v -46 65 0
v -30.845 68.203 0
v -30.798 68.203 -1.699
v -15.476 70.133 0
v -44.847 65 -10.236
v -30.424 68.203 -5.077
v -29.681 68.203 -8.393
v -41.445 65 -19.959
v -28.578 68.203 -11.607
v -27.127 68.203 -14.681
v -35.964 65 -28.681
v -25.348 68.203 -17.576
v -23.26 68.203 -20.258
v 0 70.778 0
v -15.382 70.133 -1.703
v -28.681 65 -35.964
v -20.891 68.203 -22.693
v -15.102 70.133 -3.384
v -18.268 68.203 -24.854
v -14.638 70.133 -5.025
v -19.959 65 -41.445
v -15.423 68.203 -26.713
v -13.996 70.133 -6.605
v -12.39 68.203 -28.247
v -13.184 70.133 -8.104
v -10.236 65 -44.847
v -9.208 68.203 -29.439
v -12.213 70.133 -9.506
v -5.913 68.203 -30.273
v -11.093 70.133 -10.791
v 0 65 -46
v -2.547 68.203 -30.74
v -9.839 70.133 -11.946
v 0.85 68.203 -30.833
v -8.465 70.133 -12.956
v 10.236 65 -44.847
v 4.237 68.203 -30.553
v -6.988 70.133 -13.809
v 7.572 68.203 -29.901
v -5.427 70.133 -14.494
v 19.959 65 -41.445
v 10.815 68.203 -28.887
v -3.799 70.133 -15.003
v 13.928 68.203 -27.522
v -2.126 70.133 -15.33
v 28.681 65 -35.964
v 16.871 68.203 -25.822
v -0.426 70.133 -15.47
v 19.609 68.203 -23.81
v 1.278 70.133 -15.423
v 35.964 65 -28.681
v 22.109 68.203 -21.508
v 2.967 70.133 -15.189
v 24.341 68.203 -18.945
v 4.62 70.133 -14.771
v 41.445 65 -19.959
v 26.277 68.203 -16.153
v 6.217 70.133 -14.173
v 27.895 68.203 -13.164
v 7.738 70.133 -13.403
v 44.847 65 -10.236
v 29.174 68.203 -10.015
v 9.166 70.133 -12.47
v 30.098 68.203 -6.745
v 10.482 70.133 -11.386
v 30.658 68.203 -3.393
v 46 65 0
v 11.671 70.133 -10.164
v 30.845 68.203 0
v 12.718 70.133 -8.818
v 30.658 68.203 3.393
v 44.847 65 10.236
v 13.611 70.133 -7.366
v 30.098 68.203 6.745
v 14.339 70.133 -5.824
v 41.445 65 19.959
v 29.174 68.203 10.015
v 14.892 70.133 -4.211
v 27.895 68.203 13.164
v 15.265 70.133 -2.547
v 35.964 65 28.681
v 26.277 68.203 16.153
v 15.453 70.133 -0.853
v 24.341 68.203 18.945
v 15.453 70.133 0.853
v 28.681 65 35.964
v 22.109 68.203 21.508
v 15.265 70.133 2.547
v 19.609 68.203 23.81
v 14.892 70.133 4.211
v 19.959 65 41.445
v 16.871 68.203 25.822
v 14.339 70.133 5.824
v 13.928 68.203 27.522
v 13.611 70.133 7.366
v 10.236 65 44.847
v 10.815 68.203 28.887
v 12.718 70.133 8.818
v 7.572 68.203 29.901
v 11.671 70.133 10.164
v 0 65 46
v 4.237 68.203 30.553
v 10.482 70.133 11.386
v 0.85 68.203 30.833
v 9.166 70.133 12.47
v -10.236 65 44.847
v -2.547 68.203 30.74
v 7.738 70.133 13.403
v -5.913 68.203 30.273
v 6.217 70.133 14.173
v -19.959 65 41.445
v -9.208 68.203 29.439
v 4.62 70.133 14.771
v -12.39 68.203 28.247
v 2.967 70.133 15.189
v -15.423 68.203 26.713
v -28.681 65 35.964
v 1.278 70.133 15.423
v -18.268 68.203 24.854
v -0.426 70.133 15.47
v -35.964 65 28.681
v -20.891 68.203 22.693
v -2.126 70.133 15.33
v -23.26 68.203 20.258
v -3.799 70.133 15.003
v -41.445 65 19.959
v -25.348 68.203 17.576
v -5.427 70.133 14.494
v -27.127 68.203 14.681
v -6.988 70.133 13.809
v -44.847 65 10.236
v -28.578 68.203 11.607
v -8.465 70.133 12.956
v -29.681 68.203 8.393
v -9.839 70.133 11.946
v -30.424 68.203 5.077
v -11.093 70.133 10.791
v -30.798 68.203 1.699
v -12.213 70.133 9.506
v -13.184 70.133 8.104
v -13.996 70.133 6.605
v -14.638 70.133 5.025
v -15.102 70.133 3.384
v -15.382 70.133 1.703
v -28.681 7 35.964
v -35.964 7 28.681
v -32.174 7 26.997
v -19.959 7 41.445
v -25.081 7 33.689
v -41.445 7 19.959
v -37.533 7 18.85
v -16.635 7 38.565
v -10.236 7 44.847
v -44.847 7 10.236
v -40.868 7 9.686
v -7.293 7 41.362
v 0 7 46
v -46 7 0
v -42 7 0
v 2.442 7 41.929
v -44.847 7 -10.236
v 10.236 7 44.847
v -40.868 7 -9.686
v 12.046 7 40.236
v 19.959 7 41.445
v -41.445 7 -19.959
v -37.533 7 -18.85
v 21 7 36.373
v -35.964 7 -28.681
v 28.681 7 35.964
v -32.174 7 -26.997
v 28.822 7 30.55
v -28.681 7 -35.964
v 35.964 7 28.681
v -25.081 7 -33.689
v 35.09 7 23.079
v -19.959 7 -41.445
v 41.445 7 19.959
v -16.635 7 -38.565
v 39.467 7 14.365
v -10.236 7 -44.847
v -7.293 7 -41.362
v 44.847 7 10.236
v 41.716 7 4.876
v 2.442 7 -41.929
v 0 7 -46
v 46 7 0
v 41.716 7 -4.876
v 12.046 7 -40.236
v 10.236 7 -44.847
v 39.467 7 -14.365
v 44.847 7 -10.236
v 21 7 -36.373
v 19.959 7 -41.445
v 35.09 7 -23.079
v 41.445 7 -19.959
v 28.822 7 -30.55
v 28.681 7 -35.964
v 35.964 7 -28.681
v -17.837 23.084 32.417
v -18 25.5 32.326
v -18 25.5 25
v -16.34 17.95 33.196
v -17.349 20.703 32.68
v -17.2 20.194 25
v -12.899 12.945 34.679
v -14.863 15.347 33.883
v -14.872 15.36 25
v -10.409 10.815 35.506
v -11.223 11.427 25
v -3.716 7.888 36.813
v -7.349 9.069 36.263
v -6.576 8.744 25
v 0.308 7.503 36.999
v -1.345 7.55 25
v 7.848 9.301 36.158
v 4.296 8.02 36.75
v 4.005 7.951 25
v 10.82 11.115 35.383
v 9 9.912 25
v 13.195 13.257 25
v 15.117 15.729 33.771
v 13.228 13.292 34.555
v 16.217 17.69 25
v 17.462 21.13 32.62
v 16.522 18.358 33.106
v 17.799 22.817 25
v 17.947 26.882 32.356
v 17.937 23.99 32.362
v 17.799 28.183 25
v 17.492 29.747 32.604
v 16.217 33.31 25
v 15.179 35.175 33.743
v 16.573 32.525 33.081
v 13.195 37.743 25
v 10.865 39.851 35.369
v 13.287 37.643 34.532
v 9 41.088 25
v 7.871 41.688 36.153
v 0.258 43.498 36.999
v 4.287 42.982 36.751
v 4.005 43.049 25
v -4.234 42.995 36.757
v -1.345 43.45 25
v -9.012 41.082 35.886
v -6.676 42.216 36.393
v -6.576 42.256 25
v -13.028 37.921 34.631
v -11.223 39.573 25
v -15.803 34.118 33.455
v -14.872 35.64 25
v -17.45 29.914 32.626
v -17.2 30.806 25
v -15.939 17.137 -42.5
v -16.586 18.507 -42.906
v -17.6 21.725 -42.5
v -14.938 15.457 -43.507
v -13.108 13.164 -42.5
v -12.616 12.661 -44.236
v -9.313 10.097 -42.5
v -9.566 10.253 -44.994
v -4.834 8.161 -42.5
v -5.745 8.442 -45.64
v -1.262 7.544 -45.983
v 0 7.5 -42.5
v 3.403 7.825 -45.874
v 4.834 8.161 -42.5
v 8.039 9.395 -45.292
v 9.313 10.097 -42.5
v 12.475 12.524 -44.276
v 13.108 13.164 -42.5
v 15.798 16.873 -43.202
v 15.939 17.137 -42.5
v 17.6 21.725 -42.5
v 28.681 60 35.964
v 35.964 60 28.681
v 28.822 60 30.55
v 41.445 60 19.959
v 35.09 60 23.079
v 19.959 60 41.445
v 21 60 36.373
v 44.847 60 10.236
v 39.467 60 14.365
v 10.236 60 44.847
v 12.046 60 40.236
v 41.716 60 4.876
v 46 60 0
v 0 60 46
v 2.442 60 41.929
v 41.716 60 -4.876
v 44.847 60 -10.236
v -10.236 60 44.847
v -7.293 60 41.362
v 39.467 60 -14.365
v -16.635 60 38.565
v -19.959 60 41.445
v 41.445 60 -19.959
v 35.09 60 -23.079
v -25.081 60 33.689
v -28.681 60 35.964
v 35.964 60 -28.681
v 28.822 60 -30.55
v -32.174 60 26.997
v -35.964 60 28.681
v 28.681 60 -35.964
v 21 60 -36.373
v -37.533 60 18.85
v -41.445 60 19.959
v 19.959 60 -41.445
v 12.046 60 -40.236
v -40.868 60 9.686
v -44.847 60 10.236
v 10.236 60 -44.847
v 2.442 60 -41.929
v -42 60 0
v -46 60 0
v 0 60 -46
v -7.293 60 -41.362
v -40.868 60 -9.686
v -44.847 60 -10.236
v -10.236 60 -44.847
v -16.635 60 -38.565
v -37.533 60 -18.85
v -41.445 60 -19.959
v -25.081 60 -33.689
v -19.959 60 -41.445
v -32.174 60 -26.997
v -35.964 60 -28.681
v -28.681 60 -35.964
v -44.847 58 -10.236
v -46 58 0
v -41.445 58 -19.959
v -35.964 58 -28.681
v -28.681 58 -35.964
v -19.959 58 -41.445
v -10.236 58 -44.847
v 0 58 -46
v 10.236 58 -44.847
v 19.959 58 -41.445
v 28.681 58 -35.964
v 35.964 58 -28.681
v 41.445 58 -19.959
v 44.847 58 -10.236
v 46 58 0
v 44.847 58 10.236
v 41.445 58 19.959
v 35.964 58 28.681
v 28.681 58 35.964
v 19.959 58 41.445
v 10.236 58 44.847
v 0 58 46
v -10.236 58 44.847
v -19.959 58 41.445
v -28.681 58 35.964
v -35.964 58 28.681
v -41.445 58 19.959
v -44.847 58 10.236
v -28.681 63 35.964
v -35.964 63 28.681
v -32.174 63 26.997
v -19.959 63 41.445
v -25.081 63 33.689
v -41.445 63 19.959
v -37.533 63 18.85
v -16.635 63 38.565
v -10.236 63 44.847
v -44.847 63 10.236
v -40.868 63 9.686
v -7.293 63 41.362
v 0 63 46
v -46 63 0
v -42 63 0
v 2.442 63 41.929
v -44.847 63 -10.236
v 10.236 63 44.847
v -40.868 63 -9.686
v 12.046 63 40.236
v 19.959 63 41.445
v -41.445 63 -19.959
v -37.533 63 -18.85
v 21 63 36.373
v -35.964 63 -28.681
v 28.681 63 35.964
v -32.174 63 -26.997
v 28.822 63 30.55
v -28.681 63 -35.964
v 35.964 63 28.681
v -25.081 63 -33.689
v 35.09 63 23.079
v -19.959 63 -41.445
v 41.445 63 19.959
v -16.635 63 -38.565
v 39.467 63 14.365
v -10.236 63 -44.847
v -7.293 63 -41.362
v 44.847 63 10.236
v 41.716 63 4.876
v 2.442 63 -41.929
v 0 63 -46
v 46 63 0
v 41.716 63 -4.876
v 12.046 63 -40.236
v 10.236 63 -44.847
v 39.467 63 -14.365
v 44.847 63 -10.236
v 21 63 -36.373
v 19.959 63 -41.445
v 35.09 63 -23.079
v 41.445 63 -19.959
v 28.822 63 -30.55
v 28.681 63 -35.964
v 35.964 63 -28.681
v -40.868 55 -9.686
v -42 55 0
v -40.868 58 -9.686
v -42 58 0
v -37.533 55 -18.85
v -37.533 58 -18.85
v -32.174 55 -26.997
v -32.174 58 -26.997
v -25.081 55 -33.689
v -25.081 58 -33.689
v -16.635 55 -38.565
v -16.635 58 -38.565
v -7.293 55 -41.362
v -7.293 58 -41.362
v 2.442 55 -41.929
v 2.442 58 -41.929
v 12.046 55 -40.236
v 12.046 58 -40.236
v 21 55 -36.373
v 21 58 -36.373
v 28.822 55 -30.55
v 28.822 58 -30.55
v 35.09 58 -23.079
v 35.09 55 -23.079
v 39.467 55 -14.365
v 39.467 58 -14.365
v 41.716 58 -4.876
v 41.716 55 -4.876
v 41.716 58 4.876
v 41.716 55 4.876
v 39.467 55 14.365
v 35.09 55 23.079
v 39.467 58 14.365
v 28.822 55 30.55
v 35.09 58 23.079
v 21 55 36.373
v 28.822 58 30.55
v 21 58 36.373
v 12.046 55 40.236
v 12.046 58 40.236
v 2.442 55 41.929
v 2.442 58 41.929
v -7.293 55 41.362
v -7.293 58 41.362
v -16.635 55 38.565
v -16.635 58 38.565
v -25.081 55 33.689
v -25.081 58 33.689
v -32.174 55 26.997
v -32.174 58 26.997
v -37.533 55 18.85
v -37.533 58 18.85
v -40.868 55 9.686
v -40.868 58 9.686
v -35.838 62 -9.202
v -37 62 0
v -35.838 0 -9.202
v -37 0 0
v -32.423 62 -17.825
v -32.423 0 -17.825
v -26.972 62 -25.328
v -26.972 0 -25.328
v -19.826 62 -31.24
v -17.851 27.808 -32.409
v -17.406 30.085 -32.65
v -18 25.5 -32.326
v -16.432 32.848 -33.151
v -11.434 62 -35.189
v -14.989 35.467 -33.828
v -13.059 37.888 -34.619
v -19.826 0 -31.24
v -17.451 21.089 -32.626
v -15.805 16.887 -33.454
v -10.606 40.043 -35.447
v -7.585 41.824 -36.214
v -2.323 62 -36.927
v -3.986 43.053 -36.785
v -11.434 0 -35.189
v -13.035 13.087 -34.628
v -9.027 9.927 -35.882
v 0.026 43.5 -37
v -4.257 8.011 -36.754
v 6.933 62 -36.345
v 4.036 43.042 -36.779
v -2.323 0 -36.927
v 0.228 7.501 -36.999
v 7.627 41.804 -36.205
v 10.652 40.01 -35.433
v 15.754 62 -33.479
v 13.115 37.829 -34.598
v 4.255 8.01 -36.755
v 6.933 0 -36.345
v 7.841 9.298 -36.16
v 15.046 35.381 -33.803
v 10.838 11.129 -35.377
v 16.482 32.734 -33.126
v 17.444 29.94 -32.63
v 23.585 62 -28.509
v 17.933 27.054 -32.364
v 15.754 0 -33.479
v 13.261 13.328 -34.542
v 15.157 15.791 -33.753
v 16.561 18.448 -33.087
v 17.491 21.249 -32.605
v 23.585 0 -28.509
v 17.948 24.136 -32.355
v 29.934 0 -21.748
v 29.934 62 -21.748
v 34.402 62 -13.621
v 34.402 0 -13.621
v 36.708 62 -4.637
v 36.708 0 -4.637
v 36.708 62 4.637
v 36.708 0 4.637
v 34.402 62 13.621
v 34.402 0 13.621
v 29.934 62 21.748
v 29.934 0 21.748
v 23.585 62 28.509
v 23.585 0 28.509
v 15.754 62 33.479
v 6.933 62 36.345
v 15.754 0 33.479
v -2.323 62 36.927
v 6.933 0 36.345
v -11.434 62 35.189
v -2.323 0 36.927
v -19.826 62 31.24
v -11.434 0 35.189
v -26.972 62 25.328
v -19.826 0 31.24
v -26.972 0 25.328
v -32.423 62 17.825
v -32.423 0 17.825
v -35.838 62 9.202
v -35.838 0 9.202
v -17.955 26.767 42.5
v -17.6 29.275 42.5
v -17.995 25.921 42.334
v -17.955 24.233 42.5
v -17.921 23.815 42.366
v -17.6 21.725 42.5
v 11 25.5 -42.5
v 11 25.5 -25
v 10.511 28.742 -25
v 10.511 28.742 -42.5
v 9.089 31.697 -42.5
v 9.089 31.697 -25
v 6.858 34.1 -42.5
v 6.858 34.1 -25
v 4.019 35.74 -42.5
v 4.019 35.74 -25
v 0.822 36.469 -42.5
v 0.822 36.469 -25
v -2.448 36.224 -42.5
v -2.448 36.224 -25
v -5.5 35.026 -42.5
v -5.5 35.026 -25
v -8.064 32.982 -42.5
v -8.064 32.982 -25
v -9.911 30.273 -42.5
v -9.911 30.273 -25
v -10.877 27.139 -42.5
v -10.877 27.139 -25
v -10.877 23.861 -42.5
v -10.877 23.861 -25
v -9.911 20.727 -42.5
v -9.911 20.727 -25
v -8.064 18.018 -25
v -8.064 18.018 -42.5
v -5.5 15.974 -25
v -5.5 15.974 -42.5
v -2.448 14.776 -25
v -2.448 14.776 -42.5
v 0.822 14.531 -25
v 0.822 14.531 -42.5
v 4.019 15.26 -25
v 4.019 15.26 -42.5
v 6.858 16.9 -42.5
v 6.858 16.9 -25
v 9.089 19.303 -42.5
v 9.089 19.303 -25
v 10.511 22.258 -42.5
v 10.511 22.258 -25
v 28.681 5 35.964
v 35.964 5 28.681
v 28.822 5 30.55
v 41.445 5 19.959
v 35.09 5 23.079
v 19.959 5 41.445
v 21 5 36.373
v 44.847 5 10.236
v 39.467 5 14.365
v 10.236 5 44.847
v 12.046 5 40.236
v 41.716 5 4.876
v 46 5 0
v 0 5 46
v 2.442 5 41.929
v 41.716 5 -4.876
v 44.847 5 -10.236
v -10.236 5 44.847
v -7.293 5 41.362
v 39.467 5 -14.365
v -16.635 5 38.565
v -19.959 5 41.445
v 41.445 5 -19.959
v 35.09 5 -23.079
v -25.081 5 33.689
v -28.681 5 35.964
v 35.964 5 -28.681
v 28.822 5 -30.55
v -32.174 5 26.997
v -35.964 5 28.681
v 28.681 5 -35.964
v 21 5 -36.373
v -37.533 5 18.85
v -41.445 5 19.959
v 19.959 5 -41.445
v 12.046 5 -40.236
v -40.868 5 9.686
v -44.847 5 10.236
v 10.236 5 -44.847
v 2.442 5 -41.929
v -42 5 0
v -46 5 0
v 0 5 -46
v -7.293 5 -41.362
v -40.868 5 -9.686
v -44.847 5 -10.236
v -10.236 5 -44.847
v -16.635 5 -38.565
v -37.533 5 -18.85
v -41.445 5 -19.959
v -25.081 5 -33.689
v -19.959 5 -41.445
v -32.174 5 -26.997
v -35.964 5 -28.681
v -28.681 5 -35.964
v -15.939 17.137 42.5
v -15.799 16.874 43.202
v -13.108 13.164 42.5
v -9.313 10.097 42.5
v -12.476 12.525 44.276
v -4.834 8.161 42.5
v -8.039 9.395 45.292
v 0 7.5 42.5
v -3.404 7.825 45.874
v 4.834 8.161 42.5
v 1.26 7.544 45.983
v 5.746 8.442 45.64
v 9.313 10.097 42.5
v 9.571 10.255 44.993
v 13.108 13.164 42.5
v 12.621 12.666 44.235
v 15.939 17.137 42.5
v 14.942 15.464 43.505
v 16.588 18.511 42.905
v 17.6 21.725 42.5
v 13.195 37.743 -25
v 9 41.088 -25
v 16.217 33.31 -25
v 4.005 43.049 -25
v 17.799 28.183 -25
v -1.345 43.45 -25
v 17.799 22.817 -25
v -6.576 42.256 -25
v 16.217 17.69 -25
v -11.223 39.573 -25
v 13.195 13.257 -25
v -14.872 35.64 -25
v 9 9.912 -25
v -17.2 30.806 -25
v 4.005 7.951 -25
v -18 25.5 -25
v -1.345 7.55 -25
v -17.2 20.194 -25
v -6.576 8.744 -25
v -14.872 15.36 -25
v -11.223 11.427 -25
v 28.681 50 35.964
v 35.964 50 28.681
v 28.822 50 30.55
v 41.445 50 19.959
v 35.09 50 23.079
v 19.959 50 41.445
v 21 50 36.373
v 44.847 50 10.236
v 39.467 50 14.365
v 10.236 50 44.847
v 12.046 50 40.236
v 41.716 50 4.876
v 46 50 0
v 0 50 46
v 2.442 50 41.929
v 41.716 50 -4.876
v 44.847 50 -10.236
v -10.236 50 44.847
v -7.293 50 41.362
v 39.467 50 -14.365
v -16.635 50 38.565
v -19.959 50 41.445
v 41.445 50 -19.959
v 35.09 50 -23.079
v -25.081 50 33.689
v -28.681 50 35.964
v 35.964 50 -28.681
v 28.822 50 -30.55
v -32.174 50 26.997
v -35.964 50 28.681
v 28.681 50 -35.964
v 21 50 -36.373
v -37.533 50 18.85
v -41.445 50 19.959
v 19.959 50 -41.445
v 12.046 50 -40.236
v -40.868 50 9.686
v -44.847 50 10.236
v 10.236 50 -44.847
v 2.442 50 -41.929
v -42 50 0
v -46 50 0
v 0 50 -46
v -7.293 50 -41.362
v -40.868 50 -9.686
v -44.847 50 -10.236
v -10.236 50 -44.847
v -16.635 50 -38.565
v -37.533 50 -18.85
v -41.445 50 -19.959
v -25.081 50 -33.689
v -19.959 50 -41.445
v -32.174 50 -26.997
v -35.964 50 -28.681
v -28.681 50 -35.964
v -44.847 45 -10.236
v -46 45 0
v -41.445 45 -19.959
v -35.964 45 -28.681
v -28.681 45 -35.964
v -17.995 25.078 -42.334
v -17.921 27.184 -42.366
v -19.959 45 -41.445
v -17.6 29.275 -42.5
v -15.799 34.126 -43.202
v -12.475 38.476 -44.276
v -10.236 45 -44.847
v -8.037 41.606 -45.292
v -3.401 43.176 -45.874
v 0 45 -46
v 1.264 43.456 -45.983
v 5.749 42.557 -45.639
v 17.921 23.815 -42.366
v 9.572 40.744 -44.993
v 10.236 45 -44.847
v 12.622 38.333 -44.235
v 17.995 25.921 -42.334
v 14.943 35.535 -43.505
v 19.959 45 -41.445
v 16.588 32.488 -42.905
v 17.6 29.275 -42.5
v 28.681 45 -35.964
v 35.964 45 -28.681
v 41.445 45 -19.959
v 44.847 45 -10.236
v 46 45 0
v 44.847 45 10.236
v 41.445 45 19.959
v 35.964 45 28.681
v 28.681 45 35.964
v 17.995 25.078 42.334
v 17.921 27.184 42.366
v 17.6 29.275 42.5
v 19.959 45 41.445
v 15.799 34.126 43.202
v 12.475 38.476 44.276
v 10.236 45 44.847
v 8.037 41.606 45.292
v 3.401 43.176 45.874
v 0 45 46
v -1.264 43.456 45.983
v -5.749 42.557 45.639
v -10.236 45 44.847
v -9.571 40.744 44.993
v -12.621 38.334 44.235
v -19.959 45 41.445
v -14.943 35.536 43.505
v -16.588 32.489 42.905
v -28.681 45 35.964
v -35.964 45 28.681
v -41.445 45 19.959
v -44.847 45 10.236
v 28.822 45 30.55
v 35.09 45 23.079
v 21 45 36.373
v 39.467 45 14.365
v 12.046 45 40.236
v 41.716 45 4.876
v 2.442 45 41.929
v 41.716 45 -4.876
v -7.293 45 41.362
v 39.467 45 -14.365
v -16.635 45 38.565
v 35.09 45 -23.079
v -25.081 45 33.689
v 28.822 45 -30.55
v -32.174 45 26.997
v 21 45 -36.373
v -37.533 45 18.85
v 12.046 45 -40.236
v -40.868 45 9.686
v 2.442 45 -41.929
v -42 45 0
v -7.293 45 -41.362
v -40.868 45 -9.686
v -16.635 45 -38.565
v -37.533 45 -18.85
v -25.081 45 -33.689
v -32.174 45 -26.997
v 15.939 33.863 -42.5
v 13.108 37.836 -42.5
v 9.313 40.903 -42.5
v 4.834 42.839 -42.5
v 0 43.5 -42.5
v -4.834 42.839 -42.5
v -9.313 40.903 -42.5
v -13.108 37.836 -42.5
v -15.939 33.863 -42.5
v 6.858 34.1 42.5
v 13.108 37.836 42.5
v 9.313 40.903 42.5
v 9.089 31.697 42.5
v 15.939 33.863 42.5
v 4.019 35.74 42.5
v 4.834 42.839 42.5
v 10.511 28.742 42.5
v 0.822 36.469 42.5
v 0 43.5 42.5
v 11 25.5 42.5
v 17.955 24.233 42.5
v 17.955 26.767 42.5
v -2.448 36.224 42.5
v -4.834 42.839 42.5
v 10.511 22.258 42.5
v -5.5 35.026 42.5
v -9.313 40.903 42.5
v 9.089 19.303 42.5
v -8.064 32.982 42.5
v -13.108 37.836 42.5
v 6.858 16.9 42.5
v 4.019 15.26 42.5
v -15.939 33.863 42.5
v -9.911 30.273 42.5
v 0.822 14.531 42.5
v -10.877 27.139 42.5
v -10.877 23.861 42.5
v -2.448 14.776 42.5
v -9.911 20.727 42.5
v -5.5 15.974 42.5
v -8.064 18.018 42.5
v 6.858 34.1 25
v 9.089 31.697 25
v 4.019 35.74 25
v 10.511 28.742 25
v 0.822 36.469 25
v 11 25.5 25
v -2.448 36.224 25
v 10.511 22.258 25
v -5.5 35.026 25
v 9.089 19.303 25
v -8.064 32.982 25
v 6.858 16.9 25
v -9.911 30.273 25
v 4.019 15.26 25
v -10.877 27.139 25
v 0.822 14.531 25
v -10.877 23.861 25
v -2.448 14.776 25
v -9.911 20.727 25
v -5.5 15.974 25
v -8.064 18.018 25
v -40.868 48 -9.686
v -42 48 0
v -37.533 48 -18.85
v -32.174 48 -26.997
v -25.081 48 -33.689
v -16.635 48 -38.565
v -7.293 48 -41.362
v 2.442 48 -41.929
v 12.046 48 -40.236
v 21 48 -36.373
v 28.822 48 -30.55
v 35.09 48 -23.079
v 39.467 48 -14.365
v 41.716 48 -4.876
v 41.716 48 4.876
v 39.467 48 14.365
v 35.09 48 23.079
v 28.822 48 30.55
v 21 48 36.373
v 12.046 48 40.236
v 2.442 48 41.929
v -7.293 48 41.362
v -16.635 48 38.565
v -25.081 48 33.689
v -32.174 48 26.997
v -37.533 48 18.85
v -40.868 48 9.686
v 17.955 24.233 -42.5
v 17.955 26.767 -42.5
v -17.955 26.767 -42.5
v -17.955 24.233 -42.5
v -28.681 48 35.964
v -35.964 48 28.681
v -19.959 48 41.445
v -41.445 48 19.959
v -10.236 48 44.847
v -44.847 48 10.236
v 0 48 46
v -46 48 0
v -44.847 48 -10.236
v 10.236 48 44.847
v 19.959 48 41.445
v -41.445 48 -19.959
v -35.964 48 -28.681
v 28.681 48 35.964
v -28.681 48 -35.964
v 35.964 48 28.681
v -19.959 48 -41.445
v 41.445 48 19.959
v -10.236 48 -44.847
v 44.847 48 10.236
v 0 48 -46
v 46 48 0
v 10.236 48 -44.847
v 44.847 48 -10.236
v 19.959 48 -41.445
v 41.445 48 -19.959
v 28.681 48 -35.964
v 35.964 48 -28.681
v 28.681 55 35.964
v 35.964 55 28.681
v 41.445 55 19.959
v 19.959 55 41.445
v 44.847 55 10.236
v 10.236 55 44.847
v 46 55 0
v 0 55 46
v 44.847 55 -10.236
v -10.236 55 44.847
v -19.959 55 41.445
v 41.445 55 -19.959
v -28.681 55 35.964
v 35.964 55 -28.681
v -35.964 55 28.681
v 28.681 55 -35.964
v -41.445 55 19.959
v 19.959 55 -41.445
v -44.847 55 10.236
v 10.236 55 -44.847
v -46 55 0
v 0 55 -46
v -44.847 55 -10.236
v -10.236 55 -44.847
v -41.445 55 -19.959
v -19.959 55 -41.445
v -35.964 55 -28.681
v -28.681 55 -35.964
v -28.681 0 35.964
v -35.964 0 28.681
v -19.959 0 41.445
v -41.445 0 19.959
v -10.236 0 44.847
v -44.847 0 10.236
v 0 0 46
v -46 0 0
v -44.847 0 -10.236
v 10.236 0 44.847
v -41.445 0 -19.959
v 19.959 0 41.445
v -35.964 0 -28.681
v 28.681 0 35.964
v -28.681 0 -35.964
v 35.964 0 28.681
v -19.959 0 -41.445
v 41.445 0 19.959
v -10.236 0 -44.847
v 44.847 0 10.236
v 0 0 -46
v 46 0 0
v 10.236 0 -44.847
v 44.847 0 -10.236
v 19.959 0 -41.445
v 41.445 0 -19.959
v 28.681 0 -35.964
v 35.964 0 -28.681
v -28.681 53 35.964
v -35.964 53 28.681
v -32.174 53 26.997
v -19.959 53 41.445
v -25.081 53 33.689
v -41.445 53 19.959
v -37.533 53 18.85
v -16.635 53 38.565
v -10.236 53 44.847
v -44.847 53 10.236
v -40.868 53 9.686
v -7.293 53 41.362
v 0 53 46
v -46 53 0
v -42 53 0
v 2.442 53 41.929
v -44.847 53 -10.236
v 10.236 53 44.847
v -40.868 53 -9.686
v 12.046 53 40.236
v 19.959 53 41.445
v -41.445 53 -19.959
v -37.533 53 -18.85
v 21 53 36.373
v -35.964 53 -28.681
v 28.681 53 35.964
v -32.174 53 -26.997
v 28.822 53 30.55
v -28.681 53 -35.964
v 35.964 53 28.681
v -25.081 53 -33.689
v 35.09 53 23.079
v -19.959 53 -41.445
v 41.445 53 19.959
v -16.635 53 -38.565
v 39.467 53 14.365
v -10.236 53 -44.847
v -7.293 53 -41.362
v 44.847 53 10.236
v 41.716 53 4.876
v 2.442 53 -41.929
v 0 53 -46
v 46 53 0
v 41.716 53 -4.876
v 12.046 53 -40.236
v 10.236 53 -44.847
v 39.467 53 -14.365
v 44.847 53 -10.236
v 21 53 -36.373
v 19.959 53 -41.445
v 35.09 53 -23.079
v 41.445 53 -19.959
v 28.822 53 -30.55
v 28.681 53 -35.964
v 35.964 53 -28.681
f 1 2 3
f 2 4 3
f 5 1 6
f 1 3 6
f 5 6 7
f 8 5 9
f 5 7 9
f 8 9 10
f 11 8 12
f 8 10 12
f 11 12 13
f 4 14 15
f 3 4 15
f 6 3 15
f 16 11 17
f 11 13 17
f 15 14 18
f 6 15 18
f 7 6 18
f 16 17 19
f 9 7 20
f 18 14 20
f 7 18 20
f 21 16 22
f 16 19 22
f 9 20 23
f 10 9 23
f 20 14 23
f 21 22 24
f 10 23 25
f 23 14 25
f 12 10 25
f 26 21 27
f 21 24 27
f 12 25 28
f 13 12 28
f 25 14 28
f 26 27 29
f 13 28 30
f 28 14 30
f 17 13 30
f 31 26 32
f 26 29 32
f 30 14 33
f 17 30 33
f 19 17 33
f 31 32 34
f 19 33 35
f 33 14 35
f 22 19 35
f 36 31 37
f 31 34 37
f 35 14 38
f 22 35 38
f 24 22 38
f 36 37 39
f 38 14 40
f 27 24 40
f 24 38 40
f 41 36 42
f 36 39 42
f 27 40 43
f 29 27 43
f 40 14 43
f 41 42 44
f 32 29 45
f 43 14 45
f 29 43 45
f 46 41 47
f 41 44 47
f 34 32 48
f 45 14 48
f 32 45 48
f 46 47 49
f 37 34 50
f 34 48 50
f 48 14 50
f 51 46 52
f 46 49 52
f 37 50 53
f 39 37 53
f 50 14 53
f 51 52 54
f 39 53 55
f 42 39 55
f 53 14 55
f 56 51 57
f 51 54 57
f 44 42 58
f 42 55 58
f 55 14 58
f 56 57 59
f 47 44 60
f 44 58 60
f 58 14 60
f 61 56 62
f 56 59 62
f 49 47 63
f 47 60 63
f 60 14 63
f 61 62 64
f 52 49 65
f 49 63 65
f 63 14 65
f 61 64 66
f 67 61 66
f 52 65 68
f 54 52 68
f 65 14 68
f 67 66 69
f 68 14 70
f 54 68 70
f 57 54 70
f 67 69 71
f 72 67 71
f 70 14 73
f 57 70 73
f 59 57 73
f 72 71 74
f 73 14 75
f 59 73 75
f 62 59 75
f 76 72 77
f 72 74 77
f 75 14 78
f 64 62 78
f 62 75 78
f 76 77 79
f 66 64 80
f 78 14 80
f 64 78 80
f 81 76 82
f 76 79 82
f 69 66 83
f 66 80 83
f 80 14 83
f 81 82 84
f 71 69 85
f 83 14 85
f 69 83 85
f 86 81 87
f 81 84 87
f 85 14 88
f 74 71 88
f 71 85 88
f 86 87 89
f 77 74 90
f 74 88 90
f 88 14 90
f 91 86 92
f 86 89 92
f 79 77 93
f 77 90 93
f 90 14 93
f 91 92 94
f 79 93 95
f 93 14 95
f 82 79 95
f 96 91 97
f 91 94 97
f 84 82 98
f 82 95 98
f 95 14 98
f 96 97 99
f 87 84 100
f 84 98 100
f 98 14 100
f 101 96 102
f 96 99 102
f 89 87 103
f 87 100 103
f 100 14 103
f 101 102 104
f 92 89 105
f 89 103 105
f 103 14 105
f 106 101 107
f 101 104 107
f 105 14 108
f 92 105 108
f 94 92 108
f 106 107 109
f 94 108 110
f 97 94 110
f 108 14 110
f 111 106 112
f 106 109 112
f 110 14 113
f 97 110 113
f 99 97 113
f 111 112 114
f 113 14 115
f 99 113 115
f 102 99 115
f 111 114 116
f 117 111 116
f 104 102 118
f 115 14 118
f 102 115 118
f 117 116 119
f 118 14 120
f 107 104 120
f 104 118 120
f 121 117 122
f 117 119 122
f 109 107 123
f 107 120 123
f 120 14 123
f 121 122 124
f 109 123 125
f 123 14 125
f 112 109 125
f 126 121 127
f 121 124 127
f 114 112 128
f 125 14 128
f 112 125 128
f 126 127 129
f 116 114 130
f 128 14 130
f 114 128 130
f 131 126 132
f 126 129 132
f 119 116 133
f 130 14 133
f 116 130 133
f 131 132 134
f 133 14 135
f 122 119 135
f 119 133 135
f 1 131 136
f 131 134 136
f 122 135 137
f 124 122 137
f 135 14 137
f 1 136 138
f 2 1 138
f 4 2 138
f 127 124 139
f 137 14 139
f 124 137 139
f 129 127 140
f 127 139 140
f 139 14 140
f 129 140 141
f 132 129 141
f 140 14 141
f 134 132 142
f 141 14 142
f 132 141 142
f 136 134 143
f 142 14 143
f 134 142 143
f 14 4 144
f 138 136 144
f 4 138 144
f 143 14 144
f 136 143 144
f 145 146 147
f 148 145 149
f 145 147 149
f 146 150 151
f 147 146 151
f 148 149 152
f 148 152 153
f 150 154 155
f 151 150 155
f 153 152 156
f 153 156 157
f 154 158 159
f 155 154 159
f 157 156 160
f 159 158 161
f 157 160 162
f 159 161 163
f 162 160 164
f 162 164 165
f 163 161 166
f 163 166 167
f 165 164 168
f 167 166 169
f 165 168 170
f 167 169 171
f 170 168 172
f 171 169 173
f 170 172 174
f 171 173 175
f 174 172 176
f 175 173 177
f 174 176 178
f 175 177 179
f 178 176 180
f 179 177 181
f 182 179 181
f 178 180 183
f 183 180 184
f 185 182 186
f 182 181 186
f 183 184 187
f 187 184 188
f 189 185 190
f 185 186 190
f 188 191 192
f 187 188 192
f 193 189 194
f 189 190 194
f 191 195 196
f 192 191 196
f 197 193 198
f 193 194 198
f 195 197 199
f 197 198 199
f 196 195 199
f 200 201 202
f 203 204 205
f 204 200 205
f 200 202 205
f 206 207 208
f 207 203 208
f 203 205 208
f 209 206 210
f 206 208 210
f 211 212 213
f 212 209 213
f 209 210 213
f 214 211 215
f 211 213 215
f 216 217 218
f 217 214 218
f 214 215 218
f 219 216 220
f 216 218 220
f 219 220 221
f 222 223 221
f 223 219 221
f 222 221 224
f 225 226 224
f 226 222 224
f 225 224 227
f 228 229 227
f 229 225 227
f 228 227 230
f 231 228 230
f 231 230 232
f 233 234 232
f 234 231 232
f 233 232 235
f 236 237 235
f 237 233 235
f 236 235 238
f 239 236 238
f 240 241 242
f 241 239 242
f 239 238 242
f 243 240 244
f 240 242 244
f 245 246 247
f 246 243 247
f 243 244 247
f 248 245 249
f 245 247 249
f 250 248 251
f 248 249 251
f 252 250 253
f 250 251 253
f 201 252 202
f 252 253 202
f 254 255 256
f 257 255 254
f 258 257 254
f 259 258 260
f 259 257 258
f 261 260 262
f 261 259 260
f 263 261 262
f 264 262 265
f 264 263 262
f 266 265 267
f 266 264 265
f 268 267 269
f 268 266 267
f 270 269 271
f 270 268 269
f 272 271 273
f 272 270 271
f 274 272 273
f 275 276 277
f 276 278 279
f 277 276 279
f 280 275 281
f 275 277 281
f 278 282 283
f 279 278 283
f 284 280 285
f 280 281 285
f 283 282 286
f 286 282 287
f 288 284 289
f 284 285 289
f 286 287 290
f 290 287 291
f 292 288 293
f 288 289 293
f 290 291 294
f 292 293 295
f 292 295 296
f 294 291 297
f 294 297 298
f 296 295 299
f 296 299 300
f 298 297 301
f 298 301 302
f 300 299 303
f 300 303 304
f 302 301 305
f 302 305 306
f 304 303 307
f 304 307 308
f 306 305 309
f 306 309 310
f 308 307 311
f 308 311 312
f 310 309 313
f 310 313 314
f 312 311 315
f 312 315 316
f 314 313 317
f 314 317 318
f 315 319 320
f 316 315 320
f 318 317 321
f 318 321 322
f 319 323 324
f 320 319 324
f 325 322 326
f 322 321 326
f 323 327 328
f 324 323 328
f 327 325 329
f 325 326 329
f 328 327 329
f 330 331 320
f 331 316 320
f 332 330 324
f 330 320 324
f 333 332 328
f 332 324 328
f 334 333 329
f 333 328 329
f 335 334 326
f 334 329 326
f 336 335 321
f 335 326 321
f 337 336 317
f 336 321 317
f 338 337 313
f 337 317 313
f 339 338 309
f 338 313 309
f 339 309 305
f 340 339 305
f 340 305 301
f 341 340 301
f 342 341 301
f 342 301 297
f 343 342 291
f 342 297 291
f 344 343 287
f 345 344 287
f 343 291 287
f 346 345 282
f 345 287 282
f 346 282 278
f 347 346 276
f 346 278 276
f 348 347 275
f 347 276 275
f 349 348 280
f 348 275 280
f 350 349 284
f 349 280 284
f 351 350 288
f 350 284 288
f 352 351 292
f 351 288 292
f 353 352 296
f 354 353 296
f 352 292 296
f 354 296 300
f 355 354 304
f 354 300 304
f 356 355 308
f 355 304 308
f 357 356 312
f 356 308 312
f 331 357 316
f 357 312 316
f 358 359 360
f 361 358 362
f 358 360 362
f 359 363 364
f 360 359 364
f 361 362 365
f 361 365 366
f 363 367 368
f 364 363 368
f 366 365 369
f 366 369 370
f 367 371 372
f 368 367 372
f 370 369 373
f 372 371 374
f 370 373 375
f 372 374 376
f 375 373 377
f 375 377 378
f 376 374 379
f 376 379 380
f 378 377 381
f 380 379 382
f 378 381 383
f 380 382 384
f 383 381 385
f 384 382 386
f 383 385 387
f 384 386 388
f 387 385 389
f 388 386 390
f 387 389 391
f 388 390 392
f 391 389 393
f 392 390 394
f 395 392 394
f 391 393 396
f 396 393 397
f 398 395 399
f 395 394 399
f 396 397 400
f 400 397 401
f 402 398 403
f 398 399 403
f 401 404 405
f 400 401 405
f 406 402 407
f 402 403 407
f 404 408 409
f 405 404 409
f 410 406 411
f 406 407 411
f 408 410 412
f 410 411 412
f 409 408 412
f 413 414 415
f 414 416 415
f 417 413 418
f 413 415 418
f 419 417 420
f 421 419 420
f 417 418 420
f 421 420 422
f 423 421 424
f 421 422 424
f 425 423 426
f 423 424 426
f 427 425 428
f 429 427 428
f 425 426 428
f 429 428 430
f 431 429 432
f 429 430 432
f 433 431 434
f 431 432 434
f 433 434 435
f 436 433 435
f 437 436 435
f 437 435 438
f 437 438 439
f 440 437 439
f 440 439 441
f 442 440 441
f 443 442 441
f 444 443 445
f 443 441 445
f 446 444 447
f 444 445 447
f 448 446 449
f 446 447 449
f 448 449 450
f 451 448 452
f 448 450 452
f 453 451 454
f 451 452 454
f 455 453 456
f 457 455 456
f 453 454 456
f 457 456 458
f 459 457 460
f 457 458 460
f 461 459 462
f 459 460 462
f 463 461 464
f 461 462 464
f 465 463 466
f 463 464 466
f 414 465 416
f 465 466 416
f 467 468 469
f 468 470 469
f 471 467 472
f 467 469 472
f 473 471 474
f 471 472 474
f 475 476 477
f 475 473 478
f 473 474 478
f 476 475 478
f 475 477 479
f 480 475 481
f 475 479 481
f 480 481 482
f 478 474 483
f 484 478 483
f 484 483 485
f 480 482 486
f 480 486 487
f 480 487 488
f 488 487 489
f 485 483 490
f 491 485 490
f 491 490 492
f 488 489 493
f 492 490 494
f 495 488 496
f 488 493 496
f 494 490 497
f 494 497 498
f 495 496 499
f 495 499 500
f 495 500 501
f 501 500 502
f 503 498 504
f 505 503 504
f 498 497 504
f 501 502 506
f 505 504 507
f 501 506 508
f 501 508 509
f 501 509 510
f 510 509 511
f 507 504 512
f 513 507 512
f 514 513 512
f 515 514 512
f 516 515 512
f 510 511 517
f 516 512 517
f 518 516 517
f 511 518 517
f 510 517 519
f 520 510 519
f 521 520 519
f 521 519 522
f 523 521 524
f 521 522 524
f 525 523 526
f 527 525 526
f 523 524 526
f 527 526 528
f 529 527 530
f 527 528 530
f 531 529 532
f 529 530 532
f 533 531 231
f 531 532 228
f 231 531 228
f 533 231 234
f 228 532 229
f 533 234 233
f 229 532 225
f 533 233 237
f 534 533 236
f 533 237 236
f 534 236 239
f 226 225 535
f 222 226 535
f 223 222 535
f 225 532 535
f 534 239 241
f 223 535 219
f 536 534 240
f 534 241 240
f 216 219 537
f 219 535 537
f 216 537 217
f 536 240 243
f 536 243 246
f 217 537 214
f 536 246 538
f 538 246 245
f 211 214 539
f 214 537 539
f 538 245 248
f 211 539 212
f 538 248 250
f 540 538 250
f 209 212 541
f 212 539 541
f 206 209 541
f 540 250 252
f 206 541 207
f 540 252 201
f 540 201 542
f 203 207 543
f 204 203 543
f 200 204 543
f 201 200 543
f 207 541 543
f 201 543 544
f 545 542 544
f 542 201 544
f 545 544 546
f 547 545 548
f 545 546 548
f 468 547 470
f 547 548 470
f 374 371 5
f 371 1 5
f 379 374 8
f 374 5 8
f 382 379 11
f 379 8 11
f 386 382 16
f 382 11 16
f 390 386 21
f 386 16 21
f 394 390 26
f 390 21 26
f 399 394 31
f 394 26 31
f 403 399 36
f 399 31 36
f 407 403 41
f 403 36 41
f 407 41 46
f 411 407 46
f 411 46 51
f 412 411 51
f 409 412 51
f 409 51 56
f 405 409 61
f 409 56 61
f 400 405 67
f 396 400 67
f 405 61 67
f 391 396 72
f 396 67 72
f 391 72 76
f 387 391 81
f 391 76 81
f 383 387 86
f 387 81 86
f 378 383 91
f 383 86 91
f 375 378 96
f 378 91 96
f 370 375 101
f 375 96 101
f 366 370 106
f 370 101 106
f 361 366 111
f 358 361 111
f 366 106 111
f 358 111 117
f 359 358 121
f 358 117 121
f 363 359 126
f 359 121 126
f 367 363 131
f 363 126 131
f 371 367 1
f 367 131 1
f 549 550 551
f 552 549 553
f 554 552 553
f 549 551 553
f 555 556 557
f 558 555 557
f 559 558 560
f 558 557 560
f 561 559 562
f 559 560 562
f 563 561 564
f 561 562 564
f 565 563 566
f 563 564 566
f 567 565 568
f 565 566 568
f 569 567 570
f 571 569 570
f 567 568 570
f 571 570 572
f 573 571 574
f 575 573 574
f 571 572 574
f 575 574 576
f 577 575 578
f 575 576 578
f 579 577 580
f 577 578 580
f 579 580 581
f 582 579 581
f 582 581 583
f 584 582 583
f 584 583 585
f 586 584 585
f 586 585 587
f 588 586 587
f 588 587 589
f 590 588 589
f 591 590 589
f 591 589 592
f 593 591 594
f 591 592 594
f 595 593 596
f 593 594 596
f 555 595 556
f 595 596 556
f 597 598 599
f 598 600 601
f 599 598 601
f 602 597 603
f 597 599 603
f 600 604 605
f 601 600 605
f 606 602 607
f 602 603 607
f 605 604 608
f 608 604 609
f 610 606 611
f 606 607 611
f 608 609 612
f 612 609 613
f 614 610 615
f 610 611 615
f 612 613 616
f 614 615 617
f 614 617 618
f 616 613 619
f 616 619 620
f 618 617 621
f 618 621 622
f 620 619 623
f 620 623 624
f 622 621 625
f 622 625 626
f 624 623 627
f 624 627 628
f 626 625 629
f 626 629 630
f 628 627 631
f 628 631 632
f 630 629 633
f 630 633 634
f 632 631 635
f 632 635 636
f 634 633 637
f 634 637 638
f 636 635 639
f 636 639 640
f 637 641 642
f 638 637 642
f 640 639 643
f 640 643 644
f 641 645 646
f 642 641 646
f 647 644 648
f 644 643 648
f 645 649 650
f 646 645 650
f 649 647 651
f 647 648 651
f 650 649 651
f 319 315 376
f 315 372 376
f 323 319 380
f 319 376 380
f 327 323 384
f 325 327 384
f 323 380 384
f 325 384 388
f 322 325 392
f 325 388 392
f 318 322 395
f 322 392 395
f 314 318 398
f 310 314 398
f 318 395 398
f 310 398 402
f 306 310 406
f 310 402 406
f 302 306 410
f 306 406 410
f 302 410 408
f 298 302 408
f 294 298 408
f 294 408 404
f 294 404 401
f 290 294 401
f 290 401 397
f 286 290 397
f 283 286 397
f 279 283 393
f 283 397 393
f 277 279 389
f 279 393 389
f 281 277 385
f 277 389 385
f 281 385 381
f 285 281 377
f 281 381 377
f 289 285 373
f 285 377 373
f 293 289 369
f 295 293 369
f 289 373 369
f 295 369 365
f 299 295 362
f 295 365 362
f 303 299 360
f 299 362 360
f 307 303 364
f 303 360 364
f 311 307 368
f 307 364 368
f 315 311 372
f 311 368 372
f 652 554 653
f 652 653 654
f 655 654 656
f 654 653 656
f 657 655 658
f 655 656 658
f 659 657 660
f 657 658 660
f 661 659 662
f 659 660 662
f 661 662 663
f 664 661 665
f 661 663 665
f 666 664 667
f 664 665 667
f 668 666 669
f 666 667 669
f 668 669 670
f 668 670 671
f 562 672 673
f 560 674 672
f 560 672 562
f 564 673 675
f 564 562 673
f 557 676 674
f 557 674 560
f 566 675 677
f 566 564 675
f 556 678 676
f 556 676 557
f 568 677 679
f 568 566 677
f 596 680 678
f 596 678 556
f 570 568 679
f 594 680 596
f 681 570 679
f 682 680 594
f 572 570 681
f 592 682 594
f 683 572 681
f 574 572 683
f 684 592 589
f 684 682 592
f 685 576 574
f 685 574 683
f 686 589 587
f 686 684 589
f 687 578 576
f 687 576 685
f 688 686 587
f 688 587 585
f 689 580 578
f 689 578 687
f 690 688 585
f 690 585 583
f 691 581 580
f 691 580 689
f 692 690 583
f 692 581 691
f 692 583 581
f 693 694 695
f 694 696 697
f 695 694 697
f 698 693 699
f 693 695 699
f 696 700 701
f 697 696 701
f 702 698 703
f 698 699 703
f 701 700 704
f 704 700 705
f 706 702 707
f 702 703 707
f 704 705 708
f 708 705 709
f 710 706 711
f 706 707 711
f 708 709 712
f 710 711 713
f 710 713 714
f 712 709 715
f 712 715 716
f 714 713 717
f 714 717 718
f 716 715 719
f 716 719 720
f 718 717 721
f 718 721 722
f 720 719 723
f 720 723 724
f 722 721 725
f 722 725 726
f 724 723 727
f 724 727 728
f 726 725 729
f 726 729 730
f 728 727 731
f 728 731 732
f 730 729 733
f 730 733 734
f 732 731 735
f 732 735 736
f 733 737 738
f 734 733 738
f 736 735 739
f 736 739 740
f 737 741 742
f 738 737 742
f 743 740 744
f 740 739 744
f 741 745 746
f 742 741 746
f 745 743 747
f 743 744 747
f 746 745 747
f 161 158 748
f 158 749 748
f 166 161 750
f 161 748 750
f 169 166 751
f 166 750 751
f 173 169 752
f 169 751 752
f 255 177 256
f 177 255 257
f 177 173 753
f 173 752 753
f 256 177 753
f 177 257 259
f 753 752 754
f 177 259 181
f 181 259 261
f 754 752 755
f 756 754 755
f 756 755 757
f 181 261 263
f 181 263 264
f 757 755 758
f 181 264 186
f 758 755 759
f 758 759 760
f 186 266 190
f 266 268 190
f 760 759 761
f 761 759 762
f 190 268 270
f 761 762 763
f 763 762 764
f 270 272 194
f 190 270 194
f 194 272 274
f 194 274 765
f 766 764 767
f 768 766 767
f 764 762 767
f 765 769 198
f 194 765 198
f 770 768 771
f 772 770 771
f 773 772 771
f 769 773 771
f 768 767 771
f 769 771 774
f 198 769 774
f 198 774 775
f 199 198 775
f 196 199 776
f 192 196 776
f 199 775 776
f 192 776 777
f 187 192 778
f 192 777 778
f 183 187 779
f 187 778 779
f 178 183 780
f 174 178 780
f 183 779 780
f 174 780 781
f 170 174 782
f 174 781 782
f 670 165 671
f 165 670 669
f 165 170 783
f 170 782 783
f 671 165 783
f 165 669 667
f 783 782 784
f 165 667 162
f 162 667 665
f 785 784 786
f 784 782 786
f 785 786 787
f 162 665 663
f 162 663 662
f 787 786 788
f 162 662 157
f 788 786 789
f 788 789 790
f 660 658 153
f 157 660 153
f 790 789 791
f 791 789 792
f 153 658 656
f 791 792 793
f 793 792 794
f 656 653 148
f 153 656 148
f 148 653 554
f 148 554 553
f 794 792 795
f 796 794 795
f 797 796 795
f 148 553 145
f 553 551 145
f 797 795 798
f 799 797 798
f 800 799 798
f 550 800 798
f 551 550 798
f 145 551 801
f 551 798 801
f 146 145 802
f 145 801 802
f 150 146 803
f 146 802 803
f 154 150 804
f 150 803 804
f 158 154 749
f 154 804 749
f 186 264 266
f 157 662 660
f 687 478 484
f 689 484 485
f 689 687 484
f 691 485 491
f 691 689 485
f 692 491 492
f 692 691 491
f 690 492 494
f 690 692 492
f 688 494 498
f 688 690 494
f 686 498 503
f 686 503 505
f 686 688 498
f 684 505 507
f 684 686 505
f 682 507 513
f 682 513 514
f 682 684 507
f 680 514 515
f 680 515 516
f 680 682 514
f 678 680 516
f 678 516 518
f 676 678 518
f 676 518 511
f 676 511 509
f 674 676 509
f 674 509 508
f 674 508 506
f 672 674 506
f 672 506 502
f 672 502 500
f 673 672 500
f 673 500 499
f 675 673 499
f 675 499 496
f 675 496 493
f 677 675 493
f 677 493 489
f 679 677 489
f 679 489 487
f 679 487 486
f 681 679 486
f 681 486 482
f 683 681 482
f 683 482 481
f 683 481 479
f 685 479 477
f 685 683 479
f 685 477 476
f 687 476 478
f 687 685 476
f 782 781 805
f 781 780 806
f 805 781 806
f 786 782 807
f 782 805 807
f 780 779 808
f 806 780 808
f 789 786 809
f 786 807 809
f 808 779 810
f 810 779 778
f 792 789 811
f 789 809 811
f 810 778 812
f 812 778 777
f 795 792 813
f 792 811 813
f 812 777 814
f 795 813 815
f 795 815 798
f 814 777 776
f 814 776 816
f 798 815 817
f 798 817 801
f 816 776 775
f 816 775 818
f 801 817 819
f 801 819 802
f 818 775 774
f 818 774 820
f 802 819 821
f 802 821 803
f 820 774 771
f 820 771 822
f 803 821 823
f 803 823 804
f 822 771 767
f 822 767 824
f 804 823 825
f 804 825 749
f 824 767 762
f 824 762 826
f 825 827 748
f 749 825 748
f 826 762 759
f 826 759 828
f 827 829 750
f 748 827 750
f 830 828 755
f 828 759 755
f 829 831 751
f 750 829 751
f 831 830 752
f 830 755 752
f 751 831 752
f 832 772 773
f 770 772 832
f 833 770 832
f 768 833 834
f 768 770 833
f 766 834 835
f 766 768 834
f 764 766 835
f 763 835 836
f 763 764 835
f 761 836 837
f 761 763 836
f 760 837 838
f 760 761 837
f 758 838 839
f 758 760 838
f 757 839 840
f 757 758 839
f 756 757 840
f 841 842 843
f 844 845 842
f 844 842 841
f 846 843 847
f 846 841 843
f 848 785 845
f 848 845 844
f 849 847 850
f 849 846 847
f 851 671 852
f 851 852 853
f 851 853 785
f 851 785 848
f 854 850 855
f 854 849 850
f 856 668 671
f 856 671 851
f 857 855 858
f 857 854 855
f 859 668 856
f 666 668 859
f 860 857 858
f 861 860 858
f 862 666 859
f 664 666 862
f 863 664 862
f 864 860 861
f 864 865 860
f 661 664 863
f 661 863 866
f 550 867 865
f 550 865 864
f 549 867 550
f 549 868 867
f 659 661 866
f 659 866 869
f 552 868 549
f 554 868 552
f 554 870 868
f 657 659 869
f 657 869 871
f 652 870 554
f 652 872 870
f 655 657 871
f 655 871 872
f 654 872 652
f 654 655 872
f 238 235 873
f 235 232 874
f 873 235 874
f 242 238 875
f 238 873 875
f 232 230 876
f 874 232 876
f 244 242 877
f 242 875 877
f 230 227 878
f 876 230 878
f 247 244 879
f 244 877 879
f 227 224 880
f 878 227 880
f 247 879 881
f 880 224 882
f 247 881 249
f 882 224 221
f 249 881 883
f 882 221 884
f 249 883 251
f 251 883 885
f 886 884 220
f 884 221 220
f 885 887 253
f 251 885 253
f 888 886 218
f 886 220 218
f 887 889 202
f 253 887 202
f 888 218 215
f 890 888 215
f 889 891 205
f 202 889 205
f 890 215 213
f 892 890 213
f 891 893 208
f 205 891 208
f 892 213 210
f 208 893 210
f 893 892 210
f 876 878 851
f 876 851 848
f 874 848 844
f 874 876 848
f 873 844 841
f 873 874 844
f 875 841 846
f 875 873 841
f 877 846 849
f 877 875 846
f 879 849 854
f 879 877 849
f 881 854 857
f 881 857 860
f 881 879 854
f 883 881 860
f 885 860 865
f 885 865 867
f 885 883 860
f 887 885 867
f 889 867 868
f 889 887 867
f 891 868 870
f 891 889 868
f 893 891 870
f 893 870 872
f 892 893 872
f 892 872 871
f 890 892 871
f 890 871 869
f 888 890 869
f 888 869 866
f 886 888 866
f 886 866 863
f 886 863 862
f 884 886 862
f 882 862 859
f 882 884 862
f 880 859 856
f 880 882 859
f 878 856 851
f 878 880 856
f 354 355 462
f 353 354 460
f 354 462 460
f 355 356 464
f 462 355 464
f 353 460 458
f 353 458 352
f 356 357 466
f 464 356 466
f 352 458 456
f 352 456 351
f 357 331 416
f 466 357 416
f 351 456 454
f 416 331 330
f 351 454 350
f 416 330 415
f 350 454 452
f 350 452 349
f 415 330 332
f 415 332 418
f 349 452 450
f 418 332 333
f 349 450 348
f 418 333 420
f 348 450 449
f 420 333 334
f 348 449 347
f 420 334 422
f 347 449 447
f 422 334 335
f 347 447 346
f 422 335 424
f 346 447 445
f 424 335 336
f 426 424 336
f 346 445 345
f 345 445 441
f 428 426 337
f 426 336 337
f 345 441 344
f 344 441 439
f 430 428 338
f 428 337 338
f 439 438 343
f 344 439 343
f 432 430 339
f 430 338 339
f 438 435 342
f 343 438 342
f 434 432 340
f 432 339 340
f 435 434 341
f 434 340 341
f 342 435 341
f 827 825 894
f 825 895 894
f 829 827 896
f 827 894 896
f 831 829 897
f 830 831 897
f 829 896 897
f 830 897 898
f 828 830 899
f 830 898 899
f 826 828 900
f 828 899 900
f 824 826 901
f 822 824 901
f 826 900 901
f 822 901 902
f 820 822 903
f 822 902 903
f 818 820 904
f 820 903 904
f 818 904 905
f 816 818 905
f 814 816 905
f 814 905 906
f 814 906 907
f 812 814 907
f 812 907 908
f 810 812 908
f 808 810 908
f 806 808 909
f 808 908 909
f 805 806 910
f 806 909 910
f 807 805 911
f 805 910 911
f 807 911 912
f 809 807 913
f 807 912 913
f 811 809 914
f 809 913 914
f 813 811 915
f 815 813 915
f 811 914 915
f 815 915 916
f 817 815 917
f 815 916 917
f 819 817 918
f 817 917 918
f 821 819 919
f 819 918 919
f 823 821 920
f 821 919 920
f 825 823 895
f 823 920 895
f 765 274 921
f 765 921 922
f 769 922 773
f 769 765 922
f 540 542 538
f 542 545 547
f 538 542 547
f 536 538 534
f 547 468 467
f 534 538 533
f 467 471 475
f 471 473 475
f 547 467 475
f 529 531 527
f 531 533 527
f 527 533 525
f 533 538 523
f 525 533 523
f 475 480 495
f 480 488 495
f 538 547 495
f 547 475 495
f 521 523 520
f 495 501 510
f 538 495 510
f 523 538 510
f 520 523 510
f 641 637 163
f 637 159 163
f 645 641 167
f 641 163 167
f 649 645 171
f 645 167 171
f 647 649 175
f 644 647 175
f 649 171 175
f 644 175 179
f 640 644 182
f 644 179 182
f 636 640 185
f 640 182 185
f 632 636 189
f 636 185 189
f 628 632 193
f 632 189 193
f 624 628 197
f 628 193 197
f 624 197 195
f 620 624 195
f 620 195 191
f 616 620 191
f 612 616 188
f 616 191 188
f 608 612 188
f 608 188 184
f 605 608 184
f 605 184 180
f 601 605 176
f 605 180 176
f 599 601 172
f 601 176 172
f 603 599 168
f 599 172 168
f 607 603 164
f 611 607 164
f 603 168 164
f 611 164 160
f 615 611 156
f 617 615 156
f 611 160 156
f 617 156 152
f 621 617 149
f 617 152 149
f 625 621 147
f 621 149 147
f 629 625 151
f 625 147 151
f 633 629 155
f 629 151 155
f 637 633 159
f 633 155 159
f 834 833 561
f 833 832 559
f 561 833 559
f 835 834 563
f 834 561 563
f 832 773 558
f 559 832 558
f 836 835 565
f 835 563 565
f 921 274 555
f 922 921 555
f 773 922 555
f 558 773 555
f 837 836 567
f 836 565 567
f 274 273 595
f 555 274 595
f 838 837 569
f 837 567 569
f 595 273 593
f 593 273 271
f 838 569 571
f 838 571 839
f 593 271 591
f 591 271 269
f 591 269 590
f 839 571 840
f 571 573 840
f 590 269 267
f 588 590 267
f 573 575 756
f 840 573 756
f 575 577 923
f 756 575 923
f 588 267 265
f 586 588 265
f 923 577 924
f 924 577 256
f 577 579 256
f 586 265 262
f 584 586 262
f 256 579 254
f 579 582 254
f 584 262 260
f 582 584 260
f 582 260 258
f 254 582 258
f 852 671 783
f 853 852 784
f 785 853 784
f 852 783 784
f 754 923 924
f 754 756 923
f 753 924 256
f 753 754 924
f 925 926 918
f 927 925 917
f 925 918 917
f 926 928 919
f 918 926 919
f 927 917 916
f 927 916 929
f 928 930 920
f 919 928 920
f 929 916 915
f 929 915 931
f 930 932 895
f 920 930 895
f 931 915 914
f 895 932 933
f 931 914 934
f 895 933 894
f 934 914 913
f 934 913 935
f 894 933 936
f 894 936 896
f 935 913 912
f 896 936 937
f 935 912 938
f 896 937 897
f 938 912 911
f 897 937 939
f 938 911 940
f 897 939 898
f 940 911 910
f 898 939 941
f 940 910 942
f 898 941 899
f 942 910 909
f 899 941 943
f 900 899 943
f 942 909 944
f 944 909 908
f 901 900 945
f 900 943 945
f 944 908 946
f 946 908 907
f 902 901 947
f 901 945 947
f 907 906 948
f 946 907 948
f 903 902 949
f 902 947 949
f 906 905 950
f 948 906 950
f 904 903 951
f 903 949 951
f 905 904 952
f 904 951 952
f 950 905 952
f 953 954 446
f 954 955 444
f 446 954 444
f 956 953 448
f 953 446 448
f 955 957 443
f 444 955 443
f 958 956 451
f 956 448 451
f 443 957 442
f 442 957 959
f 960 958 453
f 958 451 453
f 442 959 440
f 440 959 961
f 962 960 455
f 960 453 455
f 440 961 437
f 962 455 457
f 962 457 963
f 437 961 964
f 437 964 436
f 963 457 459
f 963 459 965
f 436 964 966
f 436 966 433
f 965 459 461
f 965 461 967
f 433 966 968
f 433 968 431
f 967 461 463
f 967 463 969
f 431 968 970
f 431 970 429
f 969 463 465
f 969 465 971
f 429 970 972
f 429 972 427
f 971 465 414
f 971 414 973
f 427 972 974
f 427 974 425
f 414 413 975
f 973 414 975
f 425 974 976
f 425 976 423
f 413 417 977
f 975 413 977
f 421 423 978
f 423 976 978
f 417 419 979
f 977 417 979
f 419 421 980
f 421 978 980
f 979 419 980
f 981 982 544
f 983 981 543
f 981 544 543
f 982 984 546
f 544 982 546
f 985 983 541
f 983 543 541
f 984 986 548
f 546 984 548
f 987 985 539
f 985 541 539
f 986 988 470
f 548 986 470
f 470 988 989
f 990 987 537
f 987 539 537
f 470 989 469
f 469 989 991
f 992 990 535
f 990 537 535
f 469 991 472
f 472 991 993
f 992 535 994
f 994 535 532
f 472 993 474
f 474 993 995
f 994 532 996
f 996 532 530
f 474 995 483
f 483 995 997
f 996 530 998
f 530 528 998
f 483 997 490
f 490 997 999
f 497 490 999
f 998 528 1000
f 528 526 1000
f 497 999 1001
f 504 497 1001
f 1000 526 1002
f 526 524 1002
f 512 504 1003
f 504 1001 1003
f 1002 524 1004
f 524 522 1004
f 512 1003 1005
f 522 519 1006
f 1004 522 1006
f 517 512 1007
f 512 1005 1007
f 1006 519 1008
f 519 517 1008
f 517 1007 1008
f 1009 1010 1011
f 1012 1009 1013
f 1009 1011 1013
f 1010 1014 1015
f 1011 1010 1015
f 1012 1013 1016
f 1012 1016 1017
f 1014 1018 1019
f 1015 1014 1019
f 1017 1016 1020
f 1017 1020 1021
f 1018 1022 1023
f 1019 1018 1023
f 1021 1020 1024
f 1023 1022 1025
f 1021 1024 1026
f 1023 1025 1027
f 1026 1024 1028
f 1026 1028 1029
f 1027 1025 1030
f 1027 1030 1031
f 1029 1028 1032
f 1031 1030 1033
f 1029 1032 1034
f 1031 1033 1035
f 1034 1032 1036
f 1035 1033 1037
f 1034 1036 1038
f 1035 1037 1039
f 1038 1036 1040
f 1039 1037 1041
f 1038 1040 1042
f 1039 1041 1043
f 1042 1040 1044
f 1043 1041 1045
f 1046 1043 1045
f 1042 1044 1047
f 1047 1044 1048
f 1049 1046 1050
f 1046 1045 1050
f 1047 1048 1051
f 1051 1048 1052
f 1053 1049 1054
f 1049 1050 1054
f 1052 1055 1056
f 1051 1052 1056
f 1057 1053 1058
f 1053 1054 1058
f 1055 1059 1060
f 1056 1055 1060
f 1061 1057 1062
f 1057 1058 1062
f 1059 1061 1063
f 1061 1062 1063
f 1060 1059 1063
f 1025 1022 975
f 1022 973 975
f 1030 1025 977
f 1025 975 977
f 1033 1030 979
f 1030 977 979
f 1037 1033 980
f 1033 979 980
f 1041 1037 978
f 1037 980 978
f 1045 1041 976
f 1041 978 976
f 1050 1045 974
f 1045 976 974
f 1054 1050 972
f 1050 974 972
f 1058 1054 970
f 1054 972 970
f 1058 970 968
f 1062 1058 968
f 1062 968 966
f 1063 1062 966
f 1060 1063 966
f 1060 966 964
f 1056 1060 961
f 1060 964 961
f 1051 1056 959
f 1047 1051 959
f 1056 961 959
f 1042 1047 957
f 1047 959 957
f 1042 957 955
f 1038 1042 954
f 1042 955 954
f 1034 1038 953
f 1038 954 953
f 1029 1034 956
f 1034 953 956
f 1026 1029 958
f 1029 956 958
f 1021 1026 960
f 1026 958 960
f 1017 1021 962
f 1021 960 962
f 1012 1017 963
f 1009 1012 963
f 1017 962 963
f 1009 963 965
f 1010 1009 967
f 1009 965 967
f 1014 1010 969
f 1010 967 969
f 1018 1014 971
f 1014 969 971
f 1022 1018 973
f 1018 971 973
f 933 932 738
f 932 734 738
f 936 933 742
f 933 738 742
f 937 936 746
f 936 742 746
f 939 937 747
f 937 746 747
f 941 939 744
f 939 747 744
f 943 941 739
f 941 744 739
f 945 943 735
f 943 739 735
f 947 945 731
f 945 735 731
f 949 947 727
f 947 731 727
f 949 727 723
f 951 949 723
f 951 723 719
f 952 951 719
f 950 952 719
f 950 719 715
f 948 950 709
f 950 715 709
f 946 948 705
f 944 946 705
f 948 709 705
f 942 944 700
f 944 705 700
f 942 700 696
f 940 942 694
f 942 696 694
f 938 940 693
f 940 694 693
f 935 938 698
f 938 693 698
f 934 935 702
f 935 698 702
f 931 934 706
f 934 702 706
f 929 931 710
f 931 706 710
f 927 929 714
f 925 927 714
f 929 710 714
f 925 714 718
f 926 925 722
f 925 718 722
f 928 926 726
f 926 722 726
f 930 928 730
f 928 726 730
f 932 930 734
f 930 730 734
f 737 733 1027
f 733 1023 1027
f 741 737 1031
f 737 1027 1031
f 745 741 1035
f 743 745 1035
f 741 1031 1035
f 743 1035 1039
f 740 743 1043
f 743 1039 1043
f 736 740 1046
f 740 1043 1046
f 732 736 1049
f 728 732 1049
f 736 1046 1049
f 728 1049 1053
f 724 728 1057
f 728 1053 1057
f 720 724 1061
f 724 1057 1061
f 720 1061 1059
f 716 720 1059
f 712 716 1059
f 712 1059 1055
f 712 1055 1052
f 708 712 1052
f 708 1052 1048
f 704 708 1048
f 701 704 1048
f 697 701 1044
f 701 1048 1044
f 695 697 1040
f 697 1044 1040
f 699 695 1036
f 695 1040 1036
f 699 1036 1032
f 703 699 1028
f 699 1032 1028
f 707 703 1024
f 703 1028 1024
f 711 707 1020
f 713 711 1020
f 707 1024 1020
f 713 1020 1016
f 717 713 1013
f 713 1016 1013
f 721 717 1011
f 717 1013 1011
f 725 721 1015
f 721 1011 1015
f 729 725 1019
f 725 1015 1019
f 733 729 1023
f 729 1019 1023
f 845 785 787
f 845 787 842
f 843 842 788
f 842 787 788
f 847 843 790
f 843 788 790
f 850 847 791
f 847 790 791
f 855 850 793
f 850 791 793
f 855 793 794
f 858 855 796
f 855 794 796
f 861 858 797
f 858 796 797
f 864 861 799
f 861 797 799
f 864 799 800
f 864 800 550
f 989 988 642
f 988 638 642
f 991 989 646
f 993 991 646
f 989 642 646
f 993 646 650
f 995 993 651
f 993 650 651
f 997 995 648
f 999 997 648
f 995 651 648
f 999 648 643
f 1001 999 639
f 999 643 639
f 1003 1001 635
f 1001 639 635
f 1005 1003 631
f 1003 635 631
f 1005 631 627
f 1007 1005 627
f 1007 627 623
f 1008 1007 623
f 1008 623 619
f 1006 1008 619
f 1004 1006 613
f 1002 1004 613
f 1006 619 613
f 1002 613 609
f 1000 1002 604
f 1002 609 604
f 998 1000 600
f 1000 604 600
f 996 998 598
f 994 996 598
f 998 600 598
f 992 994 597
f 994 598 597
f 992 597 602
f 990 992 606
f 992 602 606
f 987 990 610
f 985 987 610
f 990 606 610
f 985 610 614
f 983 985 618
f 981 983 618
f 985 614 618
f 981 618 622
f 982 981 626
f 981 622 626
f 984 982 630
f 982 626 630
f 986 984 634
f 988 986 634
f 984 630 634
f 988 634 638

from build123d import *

# Parameters (mm, degrees)
SKETCH7_W           = 18
SKETCH7_H           = 46
SKETCH8_R           = 18
SKETCH8_R_2         = 11
BOSS_EXTRUDE1_DEPTH = 17.5


with BuildPart() as part:
    # Sketch1 → Revolve1 (revolve)
    with BuildSketch(Plane.XY, mode=Mode.PRIVATE) as revolve1_sk:
        with BuildLine():
            Line((37, 0), (46, 0))
            Line((46, 0), (46, 5))
            Line((46, 5), (42, 5))
            Line((42, 5), (42, 7))
            Line((42, 7), (46, 7))
            Line((46, 7), (46, 45))
            Line((46, 45), (42, 45))
            Line((42, 45), (42, 48))
            Line((42, 48), (46, 48))
            Line((46, 48), (46, 50))
            Line((46, 50), (42, 50))
            Line((42, 50), (42, 53))
            Line((42, 53), (46, 53))
            Line((46, 53), (46, 55))
            Line((46, 55), (42, 55))
            Line((42, 55), (42, 58))
            Line((42, 58), (46, 58))
            Line((46, 58), (46, 60))
            Line((46, 60), (42, 60))
            Line((42, 60), (42, 63))
            Line((42, 63), (46, 63))
            Line((46, 63), (46, 65))
            ThreePointArc((46, 65), (23.180726365, 69.327783179), (0, 70.777914783))
            Line((0, 70.777914783), (0, 62))
            Line((0, 62), (37, 62))
            Line((37, 62), (37, 0))
        make_face()
    revolve(revolve1_sk.sketch.rotate(Axis((0, 70.777914783, 0), (0, -1, 0)), 180), axis=Axis((0, 70.777914783, 0), (0, -1, 0)))

    # Sketch7 → Ø12.0mm Dowel Hole3 (revolve, cut)
    with BuildSketch(Plane(origin=(0, 25.5, 0), x_dir=(0, 1, 0), z_dir=(1, 0, 0))):
        with Locations((9, 23)):
            Rectangle(SKETCH7_W, SKETCH7_H)
    f_12_0mm_dowel_hole3 = revolve(axis=Axis((0, 25.5, -6.35), (0, 0, 1)), mode=Mode.SUBTRACT)

    # Sketch8 → Boss-Extrude1 (add)
    with BuildSketch(Plane.XY.offset(25)):
        with Locations(Location((0, 25.5, 0), (0, 0, 180))):
            Circle(SKETCH8_R)
        with Locations((0, 25.5)):
            Circle(SKETCH8_R_2, mode=Mode.SUBTRACT)
    boss_extrude1 = extrude(amount=BOSS_EXTRUDE1_DEPTH)

    # Mirror1: Ø12.0mm Dowel Hole3, Boss-Extrude1 across plane
    add(f_12_0mm_dowel_hole3.mirror(Plane.XY), mode=Mode.SUBTRACT)
    add(boss_extrude1.mirror(Plane.XY))


solid = part.part
